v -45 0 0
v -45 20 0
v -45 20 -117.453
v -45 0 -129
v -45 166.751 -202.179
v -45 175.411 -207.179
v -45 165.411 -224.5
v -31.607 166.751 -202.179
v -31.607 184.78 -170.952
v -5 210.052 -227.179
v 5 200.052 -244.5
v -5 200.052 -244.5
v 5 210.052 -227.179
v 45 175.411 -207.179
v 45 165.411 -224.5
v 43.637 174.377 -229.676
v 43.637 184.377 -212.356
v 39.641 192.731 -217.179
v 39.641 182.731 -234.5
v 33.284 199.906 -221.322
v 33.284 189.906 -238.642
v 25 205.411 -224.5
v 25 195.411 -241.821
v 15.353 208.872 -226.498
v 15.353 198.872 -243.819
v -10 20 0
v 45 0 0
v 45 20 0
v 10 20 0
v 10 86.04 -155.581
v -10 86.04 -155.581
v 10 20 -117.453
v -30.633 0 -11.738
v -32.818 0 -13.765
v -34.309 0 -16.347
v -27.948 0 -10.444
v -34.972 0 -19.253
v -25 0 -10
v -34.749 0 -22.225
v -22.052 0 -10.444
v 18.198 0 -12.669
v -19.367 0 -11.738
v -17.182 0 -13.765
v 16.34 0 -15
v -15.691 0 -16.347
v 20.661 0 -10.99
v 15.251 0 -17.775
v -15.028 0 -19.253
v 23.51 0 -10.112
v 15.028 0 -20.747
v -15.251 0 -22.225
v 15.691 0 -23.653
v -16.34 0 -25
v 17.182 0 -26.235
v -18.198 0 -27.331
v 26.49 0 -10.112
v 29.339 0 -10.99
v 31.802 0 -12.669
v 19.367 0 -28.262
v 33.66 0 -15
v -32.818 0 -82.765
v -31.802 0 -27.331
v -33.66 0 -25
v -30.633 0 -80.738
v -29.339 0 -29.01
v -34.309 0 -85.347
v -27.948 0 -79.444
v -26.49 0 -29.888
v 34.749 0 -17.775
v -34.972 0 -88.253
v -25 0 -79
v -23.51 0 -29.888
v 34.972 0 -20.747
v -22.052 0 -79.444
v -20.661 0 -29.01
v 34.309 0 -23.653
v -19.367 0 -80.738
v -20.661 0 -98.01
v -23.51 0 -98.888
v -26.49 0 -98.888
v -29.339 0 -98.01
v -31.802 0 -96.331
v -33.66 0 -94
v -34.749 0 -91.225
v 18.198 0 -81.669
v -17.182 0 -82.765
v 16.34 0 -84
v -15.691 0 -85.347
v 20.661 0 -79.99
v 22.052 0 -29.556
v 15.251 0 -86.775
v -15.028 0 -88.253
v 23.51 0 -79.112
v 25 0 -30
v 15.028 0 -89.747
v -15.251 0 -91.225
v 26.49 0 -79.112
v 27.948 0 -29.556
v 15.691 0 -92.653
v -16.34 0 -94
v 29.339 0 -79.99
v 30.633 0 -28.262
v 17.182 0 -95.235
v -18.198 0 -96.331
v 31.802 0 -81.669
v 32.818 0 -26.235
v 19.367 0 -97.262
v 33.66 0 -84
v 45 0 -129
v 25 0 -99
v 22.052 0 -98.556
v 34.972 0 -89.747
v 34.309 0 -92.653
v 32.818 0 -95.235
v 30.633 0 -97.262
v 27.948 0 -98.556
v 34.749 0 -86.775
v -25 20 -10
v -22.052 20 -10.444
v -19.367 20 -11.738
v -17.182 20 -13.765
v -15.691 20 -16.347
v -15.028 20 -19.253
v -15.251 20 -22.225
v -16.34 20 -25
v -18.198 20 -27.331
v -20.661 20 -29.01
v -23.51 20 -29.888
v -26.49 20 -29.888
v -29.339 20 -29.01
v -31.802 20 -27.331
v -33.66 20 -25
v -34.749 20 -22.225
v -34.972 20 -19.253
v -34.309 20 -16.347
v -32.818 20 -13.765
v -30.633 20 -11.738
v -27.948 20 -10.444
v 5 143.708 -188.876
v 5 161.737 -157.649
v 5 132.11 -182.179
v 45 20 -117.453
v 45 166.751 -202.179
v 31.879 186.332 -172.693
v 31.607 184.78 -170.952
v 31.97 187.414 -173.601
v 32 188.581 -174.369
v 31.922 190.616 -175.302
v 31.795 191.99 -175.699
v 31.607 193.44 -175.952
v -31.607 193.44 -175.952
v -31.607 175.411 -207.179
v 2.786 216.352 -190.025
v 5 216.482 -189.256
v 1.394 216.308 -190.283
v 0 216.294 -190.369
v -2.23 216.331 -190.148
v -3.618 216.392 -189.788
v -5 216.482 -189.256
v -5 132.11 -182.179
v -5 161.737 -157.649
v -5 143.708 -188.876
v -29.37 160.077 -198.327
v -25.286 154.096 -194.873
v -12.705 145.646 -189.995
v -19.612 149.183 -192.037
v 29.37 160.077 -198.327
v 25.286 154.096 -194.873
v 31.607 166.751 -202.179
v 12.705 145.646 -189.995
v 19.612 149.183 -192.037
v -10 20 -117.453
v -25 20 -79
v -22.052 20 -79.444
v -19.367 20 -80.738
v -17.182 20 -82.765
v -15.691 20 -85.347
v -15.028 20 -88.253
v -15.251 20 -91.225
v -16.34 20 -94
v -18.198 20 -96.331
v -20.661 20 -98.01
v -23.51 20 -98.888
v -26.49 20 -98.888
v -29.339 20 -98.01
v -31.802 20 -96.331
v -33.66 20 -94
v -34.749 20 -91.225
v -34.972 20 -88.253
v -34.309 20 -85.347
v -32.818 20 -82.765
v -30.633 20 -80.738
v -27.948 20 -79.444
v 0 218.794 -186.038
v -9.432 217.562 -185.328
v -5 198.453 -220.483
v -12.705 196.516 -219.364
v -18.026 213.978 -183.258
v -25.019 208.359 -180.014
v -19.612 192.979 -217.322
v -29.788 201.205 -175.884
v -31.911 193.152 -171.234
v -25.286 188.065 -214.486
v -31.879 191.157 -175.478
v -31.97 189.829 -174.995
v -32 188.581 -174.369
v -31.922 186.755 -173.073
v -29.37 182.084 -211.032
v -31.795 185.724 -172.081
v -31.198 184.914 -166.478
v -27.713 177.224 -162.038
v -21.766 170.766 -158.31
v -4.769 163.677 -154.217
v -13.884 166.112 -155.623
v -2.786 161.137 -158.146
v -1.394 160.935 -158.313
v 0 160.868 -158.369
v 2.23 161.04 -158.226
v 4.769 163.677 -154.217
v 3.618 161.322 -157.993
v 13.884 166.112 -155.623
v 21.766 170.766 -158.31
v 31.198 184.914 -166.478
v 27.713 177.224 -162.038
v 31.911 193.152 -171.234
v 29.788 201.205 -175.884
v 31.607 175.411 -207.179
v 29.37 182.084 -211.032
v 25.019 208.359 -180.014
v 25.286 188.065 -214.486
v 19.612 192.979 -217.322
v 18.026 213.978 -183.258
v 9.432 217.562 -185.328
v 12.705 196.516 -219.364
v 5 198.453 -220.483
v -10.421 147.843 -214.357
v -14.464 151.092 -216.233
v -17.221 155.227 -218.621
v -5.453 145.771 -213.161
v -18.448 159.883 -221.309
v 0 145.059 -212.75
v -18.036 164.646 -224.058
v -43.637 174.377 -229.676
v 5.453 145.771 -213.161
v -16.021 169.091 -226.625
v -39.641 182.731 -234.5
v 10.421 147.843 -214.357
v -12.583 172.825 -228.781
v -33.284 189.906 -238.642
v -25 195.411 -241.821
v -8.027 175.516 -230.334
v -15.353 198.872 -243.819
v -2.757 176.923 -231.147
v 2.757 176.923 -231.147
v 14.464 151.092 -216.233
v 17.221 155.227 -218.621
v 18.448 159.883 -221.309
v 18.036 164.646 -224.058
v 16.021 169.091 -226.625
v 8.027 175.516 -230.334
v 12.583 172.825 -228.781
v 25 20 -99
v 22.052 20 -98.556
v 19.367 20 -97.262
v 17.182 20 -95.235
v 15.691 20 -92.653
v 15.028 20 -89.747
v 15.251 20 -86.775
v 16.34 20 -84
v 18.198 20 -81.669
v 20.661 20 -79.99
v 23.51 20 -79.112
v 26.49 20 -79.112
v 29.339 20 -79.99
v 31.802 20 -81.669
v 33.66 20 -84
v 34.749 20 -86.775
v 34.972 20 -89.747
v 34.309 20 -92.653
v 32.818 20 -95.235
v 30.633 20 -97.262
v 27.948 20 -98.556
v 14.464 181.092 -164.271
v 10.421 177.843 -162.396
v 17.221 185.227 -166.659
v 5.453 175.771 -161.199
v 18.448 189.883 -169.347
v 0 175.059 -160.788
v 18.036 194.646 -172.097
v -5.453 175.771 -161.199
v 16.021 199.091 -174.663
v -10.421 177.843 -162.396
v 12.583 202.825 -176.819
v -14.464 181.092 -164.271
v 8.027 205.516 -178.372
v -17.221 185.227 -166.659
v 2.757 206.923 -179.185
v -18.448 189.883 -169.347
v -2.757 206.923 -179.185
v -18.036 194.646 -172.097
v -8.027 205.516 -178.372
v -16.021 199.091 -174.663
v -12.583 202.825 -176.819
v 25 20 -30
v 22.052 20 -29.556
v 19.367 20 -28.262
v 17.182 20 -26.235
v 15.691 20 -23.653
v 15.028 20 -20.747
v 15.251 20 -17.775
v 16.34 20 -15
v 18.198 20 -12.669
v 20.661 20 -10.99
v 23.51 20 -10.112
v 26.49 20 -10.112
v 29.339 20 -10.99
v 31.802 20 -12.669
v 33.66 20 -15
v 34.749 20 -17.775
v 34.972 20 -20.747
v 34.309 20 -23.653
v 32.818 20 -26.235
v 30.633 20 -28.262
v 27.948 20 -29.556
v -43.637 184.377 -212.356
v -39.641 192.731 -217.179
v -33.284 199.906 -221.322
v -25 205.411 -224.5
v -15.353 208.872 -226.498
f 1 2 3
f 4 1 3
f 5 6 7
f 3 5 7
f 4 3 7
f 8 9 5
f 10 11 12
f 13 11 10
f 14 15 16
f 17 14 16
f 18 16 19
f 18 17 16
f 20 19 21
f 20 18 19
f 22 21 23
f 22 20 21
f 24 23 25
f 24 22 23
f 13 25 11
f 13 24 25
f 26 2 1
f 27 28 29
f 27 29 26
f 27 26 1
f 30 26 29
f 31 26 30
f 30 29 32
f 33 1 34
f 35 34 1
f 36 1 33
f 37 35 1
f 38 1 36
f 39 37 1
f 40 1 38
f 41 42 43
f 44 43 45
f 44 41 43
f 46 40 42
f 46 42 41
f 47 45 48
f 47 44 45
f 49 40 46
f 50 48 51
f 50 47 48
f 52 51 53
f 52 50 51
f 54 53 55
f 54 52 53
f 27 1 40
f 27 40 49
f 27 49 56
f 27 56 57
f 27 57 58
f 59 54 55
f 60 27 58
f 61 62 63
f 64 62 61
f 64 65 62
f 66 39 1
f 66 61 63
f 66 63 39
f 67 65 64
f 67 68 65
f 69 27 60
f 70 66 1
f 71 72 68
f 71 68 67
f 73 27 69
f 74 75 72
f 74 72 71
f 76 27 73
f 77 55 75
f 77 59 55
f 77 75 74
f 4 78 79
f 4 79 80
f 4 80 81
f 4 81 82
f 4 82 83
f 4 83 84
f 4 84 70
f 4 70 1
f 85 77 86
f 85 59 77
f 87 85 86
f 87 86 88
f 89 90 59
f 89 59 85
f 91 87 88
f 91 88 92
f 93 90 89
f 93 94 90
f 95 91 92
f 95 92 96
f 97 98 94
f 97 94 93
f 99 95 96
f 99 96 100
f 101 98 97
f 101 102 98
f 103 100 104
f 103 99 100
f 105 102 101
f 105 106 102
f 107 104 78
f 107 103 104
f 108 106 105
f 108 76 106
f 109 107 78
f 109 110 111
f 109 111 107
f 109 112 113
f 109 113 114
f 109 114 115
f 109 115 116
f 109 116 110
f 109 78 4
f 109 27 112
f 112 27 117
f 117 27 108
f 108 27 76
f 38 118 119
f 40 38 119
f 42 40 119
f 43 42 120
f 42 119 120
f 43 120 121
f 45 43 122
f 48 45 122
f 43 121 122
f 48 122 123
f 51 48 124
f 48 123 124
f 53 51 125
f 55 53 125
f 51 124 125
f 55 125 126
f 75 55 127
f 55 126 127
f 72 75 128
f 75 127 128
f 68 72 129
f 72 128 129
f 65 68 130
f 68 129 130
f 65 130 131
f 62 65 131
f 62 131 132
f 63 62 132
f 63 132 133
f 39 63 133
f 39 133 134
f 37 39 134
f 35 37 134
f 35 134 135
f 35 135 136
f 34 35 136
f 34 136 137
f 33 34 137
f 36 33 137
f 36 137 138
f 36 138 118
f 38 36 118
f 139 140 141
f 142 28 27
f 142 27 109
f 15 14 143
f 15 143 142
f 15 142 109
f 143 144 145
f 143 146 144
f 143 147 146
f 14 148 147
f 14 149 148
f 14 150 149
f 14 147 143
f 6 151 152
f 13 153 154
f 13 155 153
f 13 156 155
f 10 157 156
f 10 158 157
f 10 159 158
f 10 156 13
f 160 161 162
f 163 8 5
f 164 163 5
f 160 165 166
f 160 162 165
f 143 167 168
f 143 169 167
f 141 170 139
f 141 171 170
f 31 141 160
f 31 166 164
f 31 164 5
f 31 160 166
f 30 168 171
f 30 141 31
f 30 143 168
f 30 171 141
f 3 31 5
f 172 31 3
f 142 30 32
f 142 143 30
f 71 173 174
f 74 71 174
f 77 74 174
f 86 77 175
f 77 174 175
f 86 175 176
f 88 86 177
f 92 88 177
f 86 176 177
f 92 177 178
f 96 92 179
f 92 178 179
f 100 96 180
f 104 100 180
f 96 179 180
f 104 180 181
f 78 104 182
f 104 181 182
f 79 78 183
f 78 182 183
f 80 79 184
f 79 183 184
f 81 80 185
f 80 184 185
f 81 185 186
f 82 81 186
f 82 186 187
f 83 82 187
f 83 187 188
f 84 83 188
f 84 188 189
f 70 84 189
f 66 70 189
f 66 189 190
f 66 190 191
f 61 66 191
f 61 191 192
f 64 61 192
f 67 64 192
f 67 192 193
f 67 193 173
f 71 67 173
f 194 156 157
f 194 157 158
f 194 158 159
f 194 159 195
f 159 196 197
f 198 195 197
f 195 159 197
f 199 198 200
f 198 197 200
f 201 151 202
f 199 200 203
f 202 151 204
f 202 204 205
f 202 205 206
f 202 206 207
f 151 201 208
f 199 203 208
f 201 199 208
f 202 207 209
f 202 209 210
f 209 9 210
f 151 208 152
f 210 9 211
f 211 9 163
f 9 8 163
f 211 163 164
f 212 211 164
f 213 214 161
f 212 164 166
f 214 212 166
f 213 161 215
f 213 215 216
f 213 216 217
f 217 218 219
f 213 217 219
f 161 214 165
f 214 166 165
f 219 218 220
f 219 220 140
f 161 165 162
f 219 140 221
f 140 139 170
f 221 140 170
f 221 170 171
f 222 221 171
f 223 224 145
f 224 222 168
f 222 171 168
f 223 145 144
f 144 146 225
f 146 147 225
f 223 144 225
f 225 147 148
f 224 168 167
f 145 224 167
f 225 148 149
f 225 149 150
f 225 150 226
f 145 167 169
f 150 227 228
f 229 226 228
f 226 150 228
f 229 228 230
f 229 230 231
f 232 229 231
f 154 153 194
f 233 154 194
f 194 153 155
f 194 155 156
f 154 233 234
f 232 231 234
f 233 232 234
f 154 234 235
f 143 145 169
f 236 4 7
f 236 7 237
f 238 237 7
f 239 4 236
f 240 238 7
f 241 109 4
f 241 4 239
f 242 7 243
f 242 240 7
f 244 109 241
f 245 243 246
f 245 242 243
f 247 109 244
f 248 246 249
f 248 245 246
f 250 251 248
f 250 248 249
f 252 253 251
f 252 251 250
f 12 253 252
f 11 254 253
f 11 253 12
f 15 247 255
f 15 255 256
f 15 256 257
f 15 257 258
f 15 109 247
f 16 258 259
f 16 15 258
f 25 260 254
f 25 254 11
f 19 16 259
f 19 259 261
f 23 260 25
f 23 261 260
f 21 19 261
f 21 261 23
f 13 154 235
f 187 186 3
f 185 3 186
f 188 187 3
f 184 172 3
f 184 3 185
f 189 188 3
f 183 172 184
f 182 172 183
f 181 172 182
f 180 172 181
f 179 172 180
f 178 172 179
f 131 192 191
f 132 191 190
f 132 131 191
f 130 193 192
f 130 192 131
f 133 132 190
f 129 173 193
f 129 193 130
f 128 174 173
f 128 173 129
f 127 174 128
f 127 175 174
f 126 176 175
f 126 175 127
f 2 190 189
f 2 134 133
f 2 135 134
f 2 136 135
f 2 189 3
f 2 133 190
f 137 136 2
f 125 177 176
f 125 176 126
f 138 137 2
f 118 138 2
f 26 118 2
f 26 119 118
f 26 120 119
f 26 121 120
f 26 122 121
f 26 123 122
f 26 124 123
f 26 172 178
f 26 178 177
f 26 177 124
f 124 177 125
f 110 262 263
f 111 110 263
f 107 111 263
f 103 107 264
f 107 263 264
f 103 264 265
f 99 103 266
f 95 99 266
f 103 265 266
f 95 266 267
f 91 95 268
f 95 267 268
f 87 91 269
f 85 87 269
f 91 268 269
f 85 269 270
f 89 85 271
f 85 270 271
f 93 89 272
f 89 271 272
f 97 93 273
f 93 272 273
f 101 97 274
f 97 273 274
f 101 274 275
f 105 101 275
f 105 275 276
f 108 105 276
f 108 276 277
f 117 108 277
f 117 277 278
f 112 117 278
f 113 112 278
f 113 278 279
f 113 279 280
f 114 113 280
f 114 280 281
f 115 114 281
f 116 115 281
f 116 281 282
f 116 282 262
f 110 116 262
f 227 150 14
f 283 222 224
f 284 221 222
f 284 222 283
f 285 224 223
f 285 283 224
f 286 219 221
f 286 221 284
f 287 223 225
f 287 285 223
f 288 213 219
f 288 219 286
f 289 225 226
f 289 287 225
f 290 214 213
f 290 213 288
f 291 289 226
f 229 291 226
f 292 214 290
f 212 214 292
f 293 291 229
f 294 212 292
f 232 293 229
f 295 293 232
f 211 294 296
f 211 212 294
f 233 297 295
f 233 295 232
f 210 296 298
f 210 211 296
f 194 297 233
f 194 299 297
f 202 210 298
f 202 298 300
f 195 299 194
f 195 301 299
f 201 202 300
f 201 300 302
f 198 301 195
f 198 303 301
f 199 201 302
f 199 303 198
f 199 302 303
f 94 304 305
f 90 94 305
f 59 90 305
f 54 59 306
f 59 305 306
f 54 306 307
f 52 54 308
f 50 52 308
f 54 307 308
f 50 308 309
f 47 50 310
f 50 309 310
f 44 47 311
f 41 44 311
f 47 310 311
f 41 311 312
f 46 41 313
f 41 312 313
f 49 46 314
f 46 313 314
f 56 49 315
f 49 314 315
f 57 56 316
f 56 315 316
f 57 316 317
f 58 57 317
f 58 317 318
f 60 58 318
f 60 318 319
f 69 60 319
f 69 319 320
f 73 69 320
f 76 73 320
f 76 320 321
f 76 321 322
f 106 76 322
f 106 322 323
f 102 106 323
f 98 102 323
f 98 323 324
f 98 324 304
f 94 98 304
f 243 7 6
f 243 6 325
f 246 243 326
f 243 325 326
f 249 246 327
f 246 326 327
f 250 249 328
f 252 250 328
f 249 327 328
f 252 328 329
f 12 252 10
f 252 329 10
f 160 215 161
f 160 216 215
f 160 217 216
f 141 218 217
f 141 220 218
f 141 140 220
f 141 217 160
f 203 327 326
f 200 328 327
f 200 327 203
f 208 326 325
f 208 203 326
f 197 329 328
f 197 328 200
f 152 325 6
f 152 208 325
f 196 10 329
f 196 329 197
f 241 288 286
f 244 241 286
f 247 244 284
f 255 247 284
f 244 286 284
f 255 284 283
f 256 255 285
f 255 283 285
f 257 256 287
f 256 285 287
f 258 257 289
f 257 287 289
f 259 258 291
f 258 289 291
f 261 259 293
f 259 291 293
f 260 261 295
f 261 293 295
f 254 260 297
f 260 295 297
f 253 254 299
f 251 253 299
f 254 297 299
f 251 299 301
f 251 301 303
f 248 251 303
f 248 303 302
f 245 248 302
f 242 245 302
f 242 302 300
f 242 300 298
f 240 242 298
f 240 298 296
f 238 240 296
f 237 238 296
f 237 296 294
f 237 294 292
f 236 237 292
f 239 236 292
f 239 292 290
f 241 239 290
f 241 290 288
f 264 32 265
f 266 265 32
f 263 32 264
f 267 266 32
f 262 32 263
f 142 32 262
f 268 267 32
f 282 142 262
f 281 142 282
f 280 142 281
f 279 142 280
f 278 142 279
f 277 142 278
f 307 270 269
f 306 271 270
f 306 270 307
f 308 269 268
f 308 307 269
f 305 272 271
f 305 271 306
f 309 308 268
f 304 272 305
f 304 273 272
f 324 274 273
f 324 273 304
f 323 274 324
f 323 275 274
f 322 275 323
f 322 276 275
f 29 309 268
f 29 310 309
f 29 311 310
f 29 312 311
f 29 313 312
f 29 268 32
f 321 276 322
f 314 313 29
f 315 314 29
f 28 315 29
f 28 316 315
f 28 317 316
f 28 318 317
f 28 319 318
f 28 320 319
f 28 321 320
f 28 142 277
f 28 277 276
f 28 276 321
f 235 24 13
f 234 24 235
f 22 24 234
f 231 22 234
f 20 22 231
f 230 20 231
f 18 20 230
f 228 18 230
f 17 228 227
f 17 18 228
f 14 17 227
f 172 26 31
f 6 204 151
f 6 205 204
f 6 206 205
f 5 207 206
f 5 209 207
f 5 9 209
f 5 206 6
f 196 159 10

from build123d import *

# Parameters (mm, degrees)
BOSS_EXTRUDE1_DEPTH = 45
RIB1_REACH          = 327.464
SKETCH2_WALL_W      = 821.946192972
SKETCH2_WALL_H      = 20
SKETCH3_R           = 10
CUT_EXTRUDE1_DEPTH  = 313.929644864
FILLET1_R           = 40
SKETCH5_R           = 32
BOSS_EXTRUDE2_DEPTH = 40
SKETCH6_R           = 18.5
CUT_EXTRUDE2_DEPTH  = 320.005298403
RIB2_REACH          = 333.173
SKETCH7_WALL_W      = 701.683234458
SKETCH7_WALL_H      = 10
CIRPATTERN1_COUNT   = 4


with BuildPart() as part:
    # Sketch1 → Boss-Extrude1 (new, symmetric)
    with BuildSketch(Plane(origin=(0, 0, 0), x_dir=(0, 0, -1), z_dir=(1, 0, 0))):
        Polygon((0, 0), (129, 0), (244.5, 200.051868274), (227.179491924, 210.051868274), (117.452994616, 20), (0, 20), align=None)
    extrude(amount=BOSS_EXTRUDE1_DEPTH, both=True)

    # Sketch2 wall → Rib1 (add, up to next)
    with BuildSketch(Plane(origin=(0, 53.020201337, -77.790719439), x_dir=(0, 0.39073112849, -0.920504853452), z_dir=(0, 0.920504853452, 0.39073112849)), mode=Mode.PRIVATE) as rib1_sk1:
        Rectangle(SKETCH2_WALL_W, SKETCH2_WALL_H)
    rib1_tool1 = extrude(rib1_sk1.sketch, amount=-RIB1_REACH, mode=Mode.PRIVATE) - part.part
    add(rib1_tool1.solids().sort_by_distance((0, 53.020201337, -77.790719439))[0])

    # Sketch3 → Cut-Extrude1 (cut, through all)
    with BuildSketch(Plane(origin=(0, 20, 0), x_dir=(1, 0, 0), z_dir=(0, 1, 0))):
        with Locations(Location((-25, 20, 0), (0, 0, 270))):
            Circle(SKETCH3_R)
        with Locations(Location((-25, 89, 0), (0, 0, 270))):
            Circle(SKETCH3_R)
        with Locations(Location((25, 20, 0), (0, 0, 90))):
            Circle(SKETCH3_R)
        with Locations(Location((25, 89, 0), (0, 0, 90))):
            Circle(SKETCH3_R)
    extrude(amount=-CUT_EXTRUDE1_DEPTH, mode=Mode.SUBTRACT)

    # Fillet1
    fillet1_edges = [part.edges().sort_by_distance(p)[0] for p in [
        (45, 205.051868274, -235.839745962),
        (-45, 205.051868274, -235.839745962),
    ]]
    fillet(fillet1_edges, radius=FILLET1_R)

    # Sketch5 → Boss-Extrude2 (add)
    with BuildSketch(Plane(origin=(0, -45.858638544, -79.429491924), x_dir=(1, 0, 0), z_dir=(0, 0.49999999999999756, 0.86602540378444))):
        with Locations(Location((0, 250.5, 0), (0, 0, 90))):
            Circle(SKETCH5_R)
    extrude(amount=BOSS_EXTRUDE2_DEPTH)

    # Sketch6 → Cut-Extrude2 (cut, through all)
    with BuildSketch(Plane(origin=(0, -25.858638544, -44.788475773), x_dir=(1, 0, 0), z_dir=(0, 0.49999999999999756, 0.86602540378444))):
        with Locations(Location((0, 250.5, 0), (0, 0, 270))):
            Circle(SKETCH6_R)
    extrude(amount=-CUT_EXTRUDE2_DEPTH, mode=Mode.SUBTRACT)

    # Sketch7 wall → Rib2 (add, up to next)
    with BuildSketch(Plane(origin=(0, 213.172703149, -208.774047358), x_dir=(0, -0.16717425612, -0.985927364511), z_dir=(0, 0.985927364511, -0.16717425612)), mode=Mode.PRIVATE) as rib2_sk1:
        Rectangle(SKETCH7_WALL_W, SKETCH7_WALL_H)
    rib2_tool1 = extrude(rib2_sk1.sketch, amount=-RIB2_REACH, mode=Mode.PRIVATE) - part.part
    rib2 = rib2_tool1.solids().sort_by_distance((0, 213.172703149, -208.774047358))[0]
    add(rib2)

    # CirPattern1: Rib2 ×4 about axis
    cirpattern1_axis = Axis((0, 216.939363648, -125.25), (0, 0.49999999999999745, 0.8660254037844402))
    for i in range(1, CIRPATTERN1_COUNT):
        add(rib2.rotate(cirpattern1_axis, i * 360 / CIRPATTERN1_COUNT))


solid = part.part
